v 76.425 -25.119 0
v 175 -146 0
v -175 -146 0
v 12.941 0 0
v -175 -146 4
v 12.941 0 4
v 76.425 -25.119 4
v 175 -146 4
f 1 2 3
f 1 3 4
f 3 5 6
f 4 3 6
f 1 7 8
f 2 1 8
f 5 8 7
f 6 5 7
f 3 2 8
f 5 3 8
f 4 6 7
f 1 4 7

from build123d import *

# Parameters (mm, degrees)
F0_W     = 146
F0_H     = 4
F1_DEPTH = 175
F3_DEPTH = 4
F5_DEPTH = 4


with BuildPart() as f1:
    # F0 (on Right) → F1 (new body, symmetric)
    with BuildSketch(Plane.YZ):
        with Locations((-73, 2)):
            Rectangle(F0_W, F0_H)
    extrude(amount=F1_DEPTH, both=True)

    # F2 (on face) → F3 (cut, through all)
    with BuildSketch(Plane.XY.offset(4)):
        Polygon((-175, 0), (-175, -146), (12.940962, 0), align=None)
        Polygon((55.940962, 0), (175, -146), (175, 0), align=None)
    extrude(amount=-F3_DEPTH, mode=Mode.SUBTRACT)

    # F4 (on face) → F5 (cut, through all)
    with BuildSketch(Plane.XY.offset(4)):
        Polygon((55.940962, 0), (12.940962, 0), (76.425021, -25.119241), align=None)
    extrude(amount=-F5_DEPTH, mode=Mode.SUBTRACT)


solid = f1.part
